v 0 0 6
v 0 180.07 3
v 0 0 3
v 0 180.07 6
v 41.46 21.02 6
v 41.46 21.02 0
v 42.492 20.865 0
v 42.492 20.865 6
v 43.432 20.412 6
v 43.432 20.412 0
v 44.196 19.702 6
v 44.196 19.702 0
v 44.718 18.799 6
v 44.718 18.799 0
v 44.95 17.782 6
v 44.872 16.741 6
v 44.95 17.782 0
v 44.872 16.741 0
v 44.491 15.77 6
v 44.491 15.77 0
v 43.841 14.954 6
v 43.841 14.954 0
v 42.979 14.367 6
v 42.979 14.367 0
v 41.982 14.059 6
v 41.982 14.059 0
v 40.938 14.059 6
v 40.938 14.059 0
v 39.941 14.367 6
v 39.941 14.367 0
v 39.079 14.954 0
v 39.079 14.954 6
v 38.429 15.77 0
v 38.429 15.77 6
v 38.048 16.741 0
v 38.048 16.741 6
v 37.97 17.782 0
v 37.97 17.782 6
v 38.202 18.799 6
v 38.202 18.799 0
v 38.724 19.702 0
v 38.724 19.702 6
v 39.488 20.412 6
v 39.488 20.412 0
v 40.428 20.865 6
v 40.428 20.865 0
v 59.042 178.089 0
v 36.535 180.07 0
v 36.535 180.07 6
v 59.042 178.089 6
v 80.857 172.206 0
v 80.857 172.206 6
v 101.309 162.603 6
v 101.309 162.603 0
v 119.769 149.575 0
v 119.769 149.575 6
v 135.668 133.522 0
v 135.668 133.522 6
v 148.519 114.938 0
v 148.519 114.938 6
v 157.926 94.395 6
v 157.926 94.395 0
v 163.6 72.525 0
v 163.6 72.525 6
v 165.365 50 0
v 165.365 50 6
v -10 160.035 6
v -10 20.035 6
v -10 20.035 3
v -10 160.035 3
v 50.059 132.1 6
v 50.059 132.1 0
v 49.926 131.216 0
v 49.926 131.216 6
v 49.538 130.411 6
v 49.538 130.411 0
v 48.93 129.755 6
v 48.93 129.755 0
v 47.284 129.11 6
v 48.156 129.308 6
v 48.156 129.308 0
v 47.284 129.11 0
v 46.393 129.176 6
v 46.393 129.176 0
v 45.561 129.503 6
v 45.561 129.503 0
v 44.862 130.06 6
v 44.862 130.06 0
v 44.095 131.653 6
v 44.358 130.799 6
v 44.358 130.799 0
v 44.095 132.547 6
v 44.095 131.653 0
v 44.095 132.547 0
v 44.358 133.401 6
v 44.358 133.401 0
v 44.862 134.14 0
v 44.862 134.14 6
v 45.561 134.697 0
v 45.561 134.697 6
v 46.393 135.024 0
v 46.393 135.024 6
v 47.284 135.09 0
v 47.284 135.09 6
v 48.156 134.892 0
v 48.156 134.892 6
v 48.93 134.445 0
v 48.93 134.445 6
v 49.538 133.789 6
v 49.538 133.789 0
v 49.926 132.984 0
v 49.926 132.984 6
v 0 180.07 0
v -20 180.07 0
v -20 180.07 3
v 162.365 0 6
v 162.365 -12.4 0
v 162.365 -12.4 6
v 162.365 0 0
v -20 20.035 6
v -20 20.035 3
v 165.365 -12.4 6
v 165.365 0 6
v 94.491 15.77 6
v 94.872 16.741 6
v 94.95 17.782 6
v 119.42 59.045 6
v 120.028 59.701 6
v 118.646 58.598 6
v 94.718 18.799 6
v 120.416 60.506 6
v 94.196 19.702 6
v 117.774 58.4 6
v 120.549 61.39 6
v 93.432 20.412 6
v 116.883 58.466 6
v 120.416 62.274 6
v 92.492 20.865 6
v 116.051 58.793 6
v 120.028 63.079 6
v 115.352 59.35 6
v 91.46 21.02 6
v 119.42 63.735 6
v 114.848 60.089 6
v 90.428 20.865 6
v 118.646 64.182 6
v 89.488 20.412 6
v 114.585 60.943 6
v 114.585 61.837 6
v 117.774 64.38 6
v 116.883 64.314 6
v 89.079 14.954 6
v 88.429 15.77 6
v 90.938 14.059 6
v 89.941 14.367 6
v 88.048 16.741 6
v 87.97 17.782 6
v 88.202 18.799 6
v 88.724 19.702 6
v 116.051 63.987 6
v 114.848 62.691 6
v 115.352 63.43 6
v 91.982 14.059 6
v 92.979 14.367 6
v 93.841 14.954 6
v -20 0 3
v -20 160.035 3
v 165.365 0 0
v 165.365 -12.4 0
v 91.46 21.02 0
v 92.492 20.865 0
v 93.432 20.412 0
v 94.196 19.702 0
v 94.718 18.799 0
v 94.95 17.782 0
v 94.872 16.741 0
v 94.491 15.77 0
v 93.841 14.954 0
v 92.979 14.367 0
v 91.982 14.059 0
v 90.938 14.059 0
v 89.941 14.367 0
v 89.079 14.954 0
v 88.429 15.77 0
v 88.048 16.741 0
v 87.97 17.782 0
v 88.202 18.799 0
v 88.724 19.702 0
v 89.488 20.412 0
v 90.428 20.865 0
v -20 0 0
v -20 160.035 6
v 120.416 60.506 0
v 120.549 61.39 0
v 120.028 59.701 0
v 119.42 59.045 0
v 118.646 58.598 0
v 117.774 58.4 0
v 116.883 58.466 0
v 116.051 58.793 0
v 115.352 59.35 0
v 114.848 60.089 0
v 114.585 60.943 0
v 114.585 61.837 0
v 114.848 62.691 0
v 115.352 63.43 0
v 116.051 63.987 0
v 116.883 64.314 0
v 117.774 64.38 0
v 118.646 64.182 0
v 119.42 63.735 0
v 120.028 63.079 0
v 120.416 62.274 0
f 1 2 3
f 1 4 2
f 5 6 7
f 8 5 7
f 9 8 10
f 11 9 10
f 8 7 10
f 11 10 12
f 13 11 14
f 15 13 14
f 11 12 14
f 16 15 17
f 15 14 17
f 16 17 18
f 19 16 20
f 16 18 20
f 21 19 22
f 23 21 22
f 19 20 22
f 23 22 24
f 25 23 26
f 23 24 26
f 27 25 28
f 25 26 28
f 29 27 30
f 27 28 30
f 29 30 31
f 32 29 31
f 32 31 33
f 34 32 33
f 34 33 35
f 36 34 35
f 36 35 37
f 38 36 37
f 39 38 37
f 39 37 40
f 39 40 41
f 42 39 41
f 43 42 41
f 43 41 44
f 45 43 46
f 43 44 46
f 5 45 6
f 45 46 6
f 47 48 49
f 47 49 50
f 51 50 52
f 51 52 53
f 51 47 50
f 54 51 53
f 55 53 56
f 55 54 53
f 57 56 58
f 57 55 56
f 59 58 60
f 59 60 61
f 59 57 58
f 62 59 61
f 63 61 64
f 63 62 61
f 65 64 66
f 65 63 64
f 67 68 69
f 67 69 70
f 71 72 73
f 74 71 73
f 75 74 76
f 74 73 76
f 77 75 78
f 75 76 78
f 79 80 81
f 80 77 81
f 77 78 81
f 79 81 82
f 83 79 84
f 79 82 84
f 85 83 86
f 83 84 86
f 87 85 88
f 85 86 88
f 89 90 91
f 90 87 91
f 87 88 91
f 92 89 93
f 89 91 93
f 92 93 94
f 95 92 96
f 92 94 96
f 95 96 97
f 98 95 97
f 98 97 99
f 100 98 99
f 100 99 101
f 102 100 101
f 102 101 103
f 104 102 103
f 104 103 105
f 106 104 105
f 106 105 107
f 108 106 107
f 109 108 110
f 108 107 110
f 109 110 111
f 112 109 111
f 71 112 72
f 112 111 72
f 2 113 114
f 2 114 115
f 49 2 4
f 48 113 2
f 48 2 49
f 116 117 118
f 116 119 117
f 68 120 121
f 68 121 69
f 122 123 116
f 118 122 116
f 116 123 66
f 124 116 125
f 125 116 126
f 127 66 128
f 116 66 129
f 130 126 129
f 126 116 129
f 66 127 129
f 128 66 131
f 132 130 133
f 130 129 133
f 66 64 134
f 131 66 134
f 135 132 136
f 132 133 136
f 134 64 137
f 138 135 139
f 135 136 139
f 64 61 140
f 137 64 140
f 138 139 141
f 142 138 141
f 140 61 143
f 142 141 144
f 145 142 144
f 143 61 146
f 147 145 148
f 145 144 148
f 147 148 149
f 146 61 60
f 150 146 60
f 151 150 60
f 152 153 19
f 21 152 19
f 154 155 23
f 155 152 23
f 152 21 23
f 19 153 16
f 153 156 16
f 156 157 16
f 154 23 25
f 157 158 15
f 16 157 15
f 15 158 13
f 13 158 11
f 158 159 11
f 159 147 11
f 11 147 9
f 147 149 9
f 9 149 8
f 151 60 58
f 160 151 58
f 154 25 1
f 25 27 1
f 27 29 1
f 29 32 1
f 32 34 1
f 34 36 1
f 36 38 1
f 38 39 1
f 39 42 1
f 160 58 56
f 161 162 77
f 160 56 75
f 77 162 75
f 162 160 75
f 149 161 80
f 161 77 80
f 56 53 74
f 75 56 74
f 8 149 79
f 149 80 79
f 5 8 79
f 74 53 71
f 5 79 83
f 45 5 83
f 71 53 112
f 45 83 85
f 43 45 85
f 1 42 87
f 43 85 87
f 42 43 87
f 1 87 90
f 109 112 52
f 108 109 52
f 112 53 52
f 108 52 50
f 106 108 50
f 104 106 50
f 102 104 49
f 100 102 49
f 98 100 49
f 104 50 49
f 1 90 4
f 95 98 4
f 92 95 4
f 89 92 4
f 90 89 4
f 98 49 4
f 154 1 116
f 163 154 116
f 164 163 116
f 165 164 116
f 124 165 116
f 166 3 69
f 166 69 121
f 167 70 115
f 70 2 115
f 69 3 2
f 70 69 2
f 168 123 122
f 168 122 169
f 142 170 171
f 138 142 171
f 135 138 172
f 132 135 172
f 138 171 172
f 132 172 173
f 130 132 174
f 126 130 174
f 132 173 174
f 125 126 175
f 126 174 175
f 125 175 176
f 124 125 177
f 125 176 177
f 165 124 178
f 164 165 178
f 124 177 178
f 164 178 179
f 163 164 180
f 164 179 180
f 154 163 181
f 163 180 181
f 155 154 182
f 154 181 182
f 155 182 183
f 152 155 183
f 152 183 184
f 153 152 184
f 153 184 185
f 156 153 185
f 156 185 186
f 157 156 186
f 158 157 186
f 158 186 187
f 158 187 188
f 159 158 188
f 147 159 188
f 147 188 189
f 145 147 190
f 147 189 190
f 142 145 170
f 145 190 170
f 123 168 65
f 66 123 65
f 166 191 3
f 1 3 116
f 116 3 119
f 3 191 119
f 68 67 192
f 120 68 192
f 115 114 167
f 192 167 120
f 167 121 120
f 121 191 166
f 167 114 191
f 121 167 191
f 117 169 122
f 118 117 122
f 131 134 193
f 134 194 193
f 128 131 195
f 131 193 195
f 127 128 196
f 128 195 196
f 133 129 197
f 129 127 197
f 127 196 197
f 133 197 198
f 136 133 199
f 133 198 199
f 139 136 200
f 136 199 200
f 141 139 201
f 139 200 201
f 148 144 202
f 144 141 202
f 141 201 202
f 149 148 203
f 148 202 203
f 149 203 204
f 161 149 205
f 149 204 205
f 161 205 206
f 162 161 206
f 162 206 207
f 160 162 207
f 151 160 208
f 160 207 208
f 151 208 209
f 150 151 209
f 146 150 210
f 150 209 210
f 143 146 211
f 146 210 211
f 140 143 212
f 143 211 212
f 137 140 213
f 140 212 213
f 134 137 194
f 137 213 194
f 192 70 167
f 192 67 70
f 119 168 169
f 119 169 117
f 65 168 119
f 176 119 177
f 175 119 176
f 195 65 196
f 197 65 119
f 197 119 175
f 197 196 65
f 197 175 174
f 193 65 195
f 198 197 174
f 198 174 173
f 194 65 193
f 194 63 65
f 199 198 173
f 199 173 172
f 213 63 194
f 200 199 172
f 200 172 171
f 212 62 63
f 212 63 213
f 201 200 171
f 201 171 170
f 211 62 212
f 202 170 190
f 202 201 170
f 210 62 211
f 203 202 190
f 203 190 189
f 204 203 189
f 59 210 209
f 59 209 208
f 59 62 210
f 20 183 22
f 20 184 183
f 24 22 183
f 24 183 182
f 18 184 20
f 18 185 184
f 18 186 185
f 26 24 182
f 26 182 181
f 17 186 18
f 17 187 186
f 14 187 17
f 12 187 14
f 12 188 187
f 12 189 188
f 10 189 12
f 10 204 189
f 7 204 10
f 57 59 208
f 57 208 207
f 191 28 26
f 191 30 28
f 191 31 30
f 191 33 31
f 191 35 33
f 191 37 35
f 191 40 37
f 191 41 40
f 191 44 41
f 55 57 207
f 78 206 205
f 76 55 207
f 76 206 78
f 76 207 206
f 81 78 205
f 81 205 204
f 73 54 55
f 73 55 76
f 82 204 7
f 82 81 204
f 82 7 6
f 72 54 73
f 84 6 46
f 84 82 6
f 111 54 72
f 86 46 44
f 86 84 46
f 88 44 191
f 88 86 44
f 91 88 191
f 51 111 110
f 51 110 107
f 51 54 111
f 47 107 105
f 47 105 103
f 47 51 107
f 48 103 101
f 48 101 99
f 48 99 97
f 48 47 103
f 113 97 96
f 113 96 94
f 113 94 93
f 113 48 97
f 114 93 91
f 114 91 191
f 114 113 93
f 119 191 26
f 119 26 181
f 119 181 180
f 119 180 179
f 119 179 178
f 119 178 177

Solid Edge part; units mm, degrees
sketch "Sketch1" plane through (0, 0, 0) normal (0, 0, 1) x (1, 0, 0)
  line L0 (0, 0) -> (0, 180.07)
  line L1 (0, 180.07) -> (36.535, 180.07)
  arc A0 (36.535, 180.07) -> (165.365, 50) centre (36.535, 51.2341) cw
  line L2 (165.365, 0) -> (165.365, 50)
  line L3 (0, 0) -> (165.365, 0)
  circle A1 centre (47.06, 132.1) radius 2.9988
  circle A2 centre (117.55, 61.39) radius 2.9988
  dimension "D1" = 165.365
  dimension "D2" = 180.07
  dimension "D3" = 36.535
  dimension "D4" = 50
  dimension "D5" = 5.9975
  dimension "D6" = 47.06
  dimension "D7" = 70.49
  dimension "D8" = 70.71
  dimension "D9" = 47.97
  dimension "D10" = 128.8359
extrude "Protrusion1" add sketch "Sketch1" along normal blind 6
sketch "Sketch2" plane through (0, 90.035, 3) normal (-1, 0, 0) x (0, -1, 0)
  line L0 (-90.035, 3) -> (90.035, 3)
  line L1 (90.035, 3) -> (90.035, -3)
  line L2 (90.035, -3) -> (-90.035, -3)
  line L3 (-90.035, -3) -> (-90.035, 3)
extrude "Extrusionsausprägung_2" add sketch "Sketch2" along normal blind 20
sketch "Sketch3" plane through (72.6855, 90.035, 6) normal (0, 0, 1) x (1, 0, 0)
  line L0 (-92.6855, -70) -> (-82.6855, -70)
  line L1 (-82.6855, -70) -> (-82.6855, 70)
  line L2 (-82.6855, 70) -> (-92.6855, 70)
  line L3 (-92.6855, 70) -> (-92.6855, 90.035)
  line L4 (-92.6855, 90.035) -> (-72.6855, 90.035)
  line L5 (-72.6855, 90.035) -> (-72.6855, -90.035)
  line L6 (-72.6855, -90.035) -> (-92.6855, -90.035)
  line L7 (-92.6855, -90.035) -> (-92.6855, -70)
  dimension "D1" = 10
extrude "Extrusionsausschnitt_1" cut sketch "Sketch3" against normal blind 3
sketch "Sketch4" plane through (72.6855, 90.035, 0) normal (0, 0, -1) x (0, 1, 0)
  circle A0 centre (-72.515, -31.2255) radius 3.5
  circle A1 centre (-72.515, 18.7745) radius 3.5
  dimension "D1" = 7
  dimension "D2" = 50
  dimension "D3" = 61.46
  dimension "D4" = 17.52
extrude "Cutout1" cut sketch "Sketch4" against normal through all
sketch "Sketch5" plane through (72.6825, 0, 3) normal (0, -1, 0) x (-1, 0, 0)
  line L0 (-92.6825, 3) -> (-89.6825, 3)
  line L1 (-89.6825, 3) -> (-89.6825, -3)
  line L2 (-89.6825, -3) -> (-92.6825, -3)
  line L3 (-92.6825, -3) -> (-92.6825, 3)
extrude "Extrusionsausprägung_3" add sketch "Sketch5" along normal blind 12.4
properties material "Nylon, allgemein"
